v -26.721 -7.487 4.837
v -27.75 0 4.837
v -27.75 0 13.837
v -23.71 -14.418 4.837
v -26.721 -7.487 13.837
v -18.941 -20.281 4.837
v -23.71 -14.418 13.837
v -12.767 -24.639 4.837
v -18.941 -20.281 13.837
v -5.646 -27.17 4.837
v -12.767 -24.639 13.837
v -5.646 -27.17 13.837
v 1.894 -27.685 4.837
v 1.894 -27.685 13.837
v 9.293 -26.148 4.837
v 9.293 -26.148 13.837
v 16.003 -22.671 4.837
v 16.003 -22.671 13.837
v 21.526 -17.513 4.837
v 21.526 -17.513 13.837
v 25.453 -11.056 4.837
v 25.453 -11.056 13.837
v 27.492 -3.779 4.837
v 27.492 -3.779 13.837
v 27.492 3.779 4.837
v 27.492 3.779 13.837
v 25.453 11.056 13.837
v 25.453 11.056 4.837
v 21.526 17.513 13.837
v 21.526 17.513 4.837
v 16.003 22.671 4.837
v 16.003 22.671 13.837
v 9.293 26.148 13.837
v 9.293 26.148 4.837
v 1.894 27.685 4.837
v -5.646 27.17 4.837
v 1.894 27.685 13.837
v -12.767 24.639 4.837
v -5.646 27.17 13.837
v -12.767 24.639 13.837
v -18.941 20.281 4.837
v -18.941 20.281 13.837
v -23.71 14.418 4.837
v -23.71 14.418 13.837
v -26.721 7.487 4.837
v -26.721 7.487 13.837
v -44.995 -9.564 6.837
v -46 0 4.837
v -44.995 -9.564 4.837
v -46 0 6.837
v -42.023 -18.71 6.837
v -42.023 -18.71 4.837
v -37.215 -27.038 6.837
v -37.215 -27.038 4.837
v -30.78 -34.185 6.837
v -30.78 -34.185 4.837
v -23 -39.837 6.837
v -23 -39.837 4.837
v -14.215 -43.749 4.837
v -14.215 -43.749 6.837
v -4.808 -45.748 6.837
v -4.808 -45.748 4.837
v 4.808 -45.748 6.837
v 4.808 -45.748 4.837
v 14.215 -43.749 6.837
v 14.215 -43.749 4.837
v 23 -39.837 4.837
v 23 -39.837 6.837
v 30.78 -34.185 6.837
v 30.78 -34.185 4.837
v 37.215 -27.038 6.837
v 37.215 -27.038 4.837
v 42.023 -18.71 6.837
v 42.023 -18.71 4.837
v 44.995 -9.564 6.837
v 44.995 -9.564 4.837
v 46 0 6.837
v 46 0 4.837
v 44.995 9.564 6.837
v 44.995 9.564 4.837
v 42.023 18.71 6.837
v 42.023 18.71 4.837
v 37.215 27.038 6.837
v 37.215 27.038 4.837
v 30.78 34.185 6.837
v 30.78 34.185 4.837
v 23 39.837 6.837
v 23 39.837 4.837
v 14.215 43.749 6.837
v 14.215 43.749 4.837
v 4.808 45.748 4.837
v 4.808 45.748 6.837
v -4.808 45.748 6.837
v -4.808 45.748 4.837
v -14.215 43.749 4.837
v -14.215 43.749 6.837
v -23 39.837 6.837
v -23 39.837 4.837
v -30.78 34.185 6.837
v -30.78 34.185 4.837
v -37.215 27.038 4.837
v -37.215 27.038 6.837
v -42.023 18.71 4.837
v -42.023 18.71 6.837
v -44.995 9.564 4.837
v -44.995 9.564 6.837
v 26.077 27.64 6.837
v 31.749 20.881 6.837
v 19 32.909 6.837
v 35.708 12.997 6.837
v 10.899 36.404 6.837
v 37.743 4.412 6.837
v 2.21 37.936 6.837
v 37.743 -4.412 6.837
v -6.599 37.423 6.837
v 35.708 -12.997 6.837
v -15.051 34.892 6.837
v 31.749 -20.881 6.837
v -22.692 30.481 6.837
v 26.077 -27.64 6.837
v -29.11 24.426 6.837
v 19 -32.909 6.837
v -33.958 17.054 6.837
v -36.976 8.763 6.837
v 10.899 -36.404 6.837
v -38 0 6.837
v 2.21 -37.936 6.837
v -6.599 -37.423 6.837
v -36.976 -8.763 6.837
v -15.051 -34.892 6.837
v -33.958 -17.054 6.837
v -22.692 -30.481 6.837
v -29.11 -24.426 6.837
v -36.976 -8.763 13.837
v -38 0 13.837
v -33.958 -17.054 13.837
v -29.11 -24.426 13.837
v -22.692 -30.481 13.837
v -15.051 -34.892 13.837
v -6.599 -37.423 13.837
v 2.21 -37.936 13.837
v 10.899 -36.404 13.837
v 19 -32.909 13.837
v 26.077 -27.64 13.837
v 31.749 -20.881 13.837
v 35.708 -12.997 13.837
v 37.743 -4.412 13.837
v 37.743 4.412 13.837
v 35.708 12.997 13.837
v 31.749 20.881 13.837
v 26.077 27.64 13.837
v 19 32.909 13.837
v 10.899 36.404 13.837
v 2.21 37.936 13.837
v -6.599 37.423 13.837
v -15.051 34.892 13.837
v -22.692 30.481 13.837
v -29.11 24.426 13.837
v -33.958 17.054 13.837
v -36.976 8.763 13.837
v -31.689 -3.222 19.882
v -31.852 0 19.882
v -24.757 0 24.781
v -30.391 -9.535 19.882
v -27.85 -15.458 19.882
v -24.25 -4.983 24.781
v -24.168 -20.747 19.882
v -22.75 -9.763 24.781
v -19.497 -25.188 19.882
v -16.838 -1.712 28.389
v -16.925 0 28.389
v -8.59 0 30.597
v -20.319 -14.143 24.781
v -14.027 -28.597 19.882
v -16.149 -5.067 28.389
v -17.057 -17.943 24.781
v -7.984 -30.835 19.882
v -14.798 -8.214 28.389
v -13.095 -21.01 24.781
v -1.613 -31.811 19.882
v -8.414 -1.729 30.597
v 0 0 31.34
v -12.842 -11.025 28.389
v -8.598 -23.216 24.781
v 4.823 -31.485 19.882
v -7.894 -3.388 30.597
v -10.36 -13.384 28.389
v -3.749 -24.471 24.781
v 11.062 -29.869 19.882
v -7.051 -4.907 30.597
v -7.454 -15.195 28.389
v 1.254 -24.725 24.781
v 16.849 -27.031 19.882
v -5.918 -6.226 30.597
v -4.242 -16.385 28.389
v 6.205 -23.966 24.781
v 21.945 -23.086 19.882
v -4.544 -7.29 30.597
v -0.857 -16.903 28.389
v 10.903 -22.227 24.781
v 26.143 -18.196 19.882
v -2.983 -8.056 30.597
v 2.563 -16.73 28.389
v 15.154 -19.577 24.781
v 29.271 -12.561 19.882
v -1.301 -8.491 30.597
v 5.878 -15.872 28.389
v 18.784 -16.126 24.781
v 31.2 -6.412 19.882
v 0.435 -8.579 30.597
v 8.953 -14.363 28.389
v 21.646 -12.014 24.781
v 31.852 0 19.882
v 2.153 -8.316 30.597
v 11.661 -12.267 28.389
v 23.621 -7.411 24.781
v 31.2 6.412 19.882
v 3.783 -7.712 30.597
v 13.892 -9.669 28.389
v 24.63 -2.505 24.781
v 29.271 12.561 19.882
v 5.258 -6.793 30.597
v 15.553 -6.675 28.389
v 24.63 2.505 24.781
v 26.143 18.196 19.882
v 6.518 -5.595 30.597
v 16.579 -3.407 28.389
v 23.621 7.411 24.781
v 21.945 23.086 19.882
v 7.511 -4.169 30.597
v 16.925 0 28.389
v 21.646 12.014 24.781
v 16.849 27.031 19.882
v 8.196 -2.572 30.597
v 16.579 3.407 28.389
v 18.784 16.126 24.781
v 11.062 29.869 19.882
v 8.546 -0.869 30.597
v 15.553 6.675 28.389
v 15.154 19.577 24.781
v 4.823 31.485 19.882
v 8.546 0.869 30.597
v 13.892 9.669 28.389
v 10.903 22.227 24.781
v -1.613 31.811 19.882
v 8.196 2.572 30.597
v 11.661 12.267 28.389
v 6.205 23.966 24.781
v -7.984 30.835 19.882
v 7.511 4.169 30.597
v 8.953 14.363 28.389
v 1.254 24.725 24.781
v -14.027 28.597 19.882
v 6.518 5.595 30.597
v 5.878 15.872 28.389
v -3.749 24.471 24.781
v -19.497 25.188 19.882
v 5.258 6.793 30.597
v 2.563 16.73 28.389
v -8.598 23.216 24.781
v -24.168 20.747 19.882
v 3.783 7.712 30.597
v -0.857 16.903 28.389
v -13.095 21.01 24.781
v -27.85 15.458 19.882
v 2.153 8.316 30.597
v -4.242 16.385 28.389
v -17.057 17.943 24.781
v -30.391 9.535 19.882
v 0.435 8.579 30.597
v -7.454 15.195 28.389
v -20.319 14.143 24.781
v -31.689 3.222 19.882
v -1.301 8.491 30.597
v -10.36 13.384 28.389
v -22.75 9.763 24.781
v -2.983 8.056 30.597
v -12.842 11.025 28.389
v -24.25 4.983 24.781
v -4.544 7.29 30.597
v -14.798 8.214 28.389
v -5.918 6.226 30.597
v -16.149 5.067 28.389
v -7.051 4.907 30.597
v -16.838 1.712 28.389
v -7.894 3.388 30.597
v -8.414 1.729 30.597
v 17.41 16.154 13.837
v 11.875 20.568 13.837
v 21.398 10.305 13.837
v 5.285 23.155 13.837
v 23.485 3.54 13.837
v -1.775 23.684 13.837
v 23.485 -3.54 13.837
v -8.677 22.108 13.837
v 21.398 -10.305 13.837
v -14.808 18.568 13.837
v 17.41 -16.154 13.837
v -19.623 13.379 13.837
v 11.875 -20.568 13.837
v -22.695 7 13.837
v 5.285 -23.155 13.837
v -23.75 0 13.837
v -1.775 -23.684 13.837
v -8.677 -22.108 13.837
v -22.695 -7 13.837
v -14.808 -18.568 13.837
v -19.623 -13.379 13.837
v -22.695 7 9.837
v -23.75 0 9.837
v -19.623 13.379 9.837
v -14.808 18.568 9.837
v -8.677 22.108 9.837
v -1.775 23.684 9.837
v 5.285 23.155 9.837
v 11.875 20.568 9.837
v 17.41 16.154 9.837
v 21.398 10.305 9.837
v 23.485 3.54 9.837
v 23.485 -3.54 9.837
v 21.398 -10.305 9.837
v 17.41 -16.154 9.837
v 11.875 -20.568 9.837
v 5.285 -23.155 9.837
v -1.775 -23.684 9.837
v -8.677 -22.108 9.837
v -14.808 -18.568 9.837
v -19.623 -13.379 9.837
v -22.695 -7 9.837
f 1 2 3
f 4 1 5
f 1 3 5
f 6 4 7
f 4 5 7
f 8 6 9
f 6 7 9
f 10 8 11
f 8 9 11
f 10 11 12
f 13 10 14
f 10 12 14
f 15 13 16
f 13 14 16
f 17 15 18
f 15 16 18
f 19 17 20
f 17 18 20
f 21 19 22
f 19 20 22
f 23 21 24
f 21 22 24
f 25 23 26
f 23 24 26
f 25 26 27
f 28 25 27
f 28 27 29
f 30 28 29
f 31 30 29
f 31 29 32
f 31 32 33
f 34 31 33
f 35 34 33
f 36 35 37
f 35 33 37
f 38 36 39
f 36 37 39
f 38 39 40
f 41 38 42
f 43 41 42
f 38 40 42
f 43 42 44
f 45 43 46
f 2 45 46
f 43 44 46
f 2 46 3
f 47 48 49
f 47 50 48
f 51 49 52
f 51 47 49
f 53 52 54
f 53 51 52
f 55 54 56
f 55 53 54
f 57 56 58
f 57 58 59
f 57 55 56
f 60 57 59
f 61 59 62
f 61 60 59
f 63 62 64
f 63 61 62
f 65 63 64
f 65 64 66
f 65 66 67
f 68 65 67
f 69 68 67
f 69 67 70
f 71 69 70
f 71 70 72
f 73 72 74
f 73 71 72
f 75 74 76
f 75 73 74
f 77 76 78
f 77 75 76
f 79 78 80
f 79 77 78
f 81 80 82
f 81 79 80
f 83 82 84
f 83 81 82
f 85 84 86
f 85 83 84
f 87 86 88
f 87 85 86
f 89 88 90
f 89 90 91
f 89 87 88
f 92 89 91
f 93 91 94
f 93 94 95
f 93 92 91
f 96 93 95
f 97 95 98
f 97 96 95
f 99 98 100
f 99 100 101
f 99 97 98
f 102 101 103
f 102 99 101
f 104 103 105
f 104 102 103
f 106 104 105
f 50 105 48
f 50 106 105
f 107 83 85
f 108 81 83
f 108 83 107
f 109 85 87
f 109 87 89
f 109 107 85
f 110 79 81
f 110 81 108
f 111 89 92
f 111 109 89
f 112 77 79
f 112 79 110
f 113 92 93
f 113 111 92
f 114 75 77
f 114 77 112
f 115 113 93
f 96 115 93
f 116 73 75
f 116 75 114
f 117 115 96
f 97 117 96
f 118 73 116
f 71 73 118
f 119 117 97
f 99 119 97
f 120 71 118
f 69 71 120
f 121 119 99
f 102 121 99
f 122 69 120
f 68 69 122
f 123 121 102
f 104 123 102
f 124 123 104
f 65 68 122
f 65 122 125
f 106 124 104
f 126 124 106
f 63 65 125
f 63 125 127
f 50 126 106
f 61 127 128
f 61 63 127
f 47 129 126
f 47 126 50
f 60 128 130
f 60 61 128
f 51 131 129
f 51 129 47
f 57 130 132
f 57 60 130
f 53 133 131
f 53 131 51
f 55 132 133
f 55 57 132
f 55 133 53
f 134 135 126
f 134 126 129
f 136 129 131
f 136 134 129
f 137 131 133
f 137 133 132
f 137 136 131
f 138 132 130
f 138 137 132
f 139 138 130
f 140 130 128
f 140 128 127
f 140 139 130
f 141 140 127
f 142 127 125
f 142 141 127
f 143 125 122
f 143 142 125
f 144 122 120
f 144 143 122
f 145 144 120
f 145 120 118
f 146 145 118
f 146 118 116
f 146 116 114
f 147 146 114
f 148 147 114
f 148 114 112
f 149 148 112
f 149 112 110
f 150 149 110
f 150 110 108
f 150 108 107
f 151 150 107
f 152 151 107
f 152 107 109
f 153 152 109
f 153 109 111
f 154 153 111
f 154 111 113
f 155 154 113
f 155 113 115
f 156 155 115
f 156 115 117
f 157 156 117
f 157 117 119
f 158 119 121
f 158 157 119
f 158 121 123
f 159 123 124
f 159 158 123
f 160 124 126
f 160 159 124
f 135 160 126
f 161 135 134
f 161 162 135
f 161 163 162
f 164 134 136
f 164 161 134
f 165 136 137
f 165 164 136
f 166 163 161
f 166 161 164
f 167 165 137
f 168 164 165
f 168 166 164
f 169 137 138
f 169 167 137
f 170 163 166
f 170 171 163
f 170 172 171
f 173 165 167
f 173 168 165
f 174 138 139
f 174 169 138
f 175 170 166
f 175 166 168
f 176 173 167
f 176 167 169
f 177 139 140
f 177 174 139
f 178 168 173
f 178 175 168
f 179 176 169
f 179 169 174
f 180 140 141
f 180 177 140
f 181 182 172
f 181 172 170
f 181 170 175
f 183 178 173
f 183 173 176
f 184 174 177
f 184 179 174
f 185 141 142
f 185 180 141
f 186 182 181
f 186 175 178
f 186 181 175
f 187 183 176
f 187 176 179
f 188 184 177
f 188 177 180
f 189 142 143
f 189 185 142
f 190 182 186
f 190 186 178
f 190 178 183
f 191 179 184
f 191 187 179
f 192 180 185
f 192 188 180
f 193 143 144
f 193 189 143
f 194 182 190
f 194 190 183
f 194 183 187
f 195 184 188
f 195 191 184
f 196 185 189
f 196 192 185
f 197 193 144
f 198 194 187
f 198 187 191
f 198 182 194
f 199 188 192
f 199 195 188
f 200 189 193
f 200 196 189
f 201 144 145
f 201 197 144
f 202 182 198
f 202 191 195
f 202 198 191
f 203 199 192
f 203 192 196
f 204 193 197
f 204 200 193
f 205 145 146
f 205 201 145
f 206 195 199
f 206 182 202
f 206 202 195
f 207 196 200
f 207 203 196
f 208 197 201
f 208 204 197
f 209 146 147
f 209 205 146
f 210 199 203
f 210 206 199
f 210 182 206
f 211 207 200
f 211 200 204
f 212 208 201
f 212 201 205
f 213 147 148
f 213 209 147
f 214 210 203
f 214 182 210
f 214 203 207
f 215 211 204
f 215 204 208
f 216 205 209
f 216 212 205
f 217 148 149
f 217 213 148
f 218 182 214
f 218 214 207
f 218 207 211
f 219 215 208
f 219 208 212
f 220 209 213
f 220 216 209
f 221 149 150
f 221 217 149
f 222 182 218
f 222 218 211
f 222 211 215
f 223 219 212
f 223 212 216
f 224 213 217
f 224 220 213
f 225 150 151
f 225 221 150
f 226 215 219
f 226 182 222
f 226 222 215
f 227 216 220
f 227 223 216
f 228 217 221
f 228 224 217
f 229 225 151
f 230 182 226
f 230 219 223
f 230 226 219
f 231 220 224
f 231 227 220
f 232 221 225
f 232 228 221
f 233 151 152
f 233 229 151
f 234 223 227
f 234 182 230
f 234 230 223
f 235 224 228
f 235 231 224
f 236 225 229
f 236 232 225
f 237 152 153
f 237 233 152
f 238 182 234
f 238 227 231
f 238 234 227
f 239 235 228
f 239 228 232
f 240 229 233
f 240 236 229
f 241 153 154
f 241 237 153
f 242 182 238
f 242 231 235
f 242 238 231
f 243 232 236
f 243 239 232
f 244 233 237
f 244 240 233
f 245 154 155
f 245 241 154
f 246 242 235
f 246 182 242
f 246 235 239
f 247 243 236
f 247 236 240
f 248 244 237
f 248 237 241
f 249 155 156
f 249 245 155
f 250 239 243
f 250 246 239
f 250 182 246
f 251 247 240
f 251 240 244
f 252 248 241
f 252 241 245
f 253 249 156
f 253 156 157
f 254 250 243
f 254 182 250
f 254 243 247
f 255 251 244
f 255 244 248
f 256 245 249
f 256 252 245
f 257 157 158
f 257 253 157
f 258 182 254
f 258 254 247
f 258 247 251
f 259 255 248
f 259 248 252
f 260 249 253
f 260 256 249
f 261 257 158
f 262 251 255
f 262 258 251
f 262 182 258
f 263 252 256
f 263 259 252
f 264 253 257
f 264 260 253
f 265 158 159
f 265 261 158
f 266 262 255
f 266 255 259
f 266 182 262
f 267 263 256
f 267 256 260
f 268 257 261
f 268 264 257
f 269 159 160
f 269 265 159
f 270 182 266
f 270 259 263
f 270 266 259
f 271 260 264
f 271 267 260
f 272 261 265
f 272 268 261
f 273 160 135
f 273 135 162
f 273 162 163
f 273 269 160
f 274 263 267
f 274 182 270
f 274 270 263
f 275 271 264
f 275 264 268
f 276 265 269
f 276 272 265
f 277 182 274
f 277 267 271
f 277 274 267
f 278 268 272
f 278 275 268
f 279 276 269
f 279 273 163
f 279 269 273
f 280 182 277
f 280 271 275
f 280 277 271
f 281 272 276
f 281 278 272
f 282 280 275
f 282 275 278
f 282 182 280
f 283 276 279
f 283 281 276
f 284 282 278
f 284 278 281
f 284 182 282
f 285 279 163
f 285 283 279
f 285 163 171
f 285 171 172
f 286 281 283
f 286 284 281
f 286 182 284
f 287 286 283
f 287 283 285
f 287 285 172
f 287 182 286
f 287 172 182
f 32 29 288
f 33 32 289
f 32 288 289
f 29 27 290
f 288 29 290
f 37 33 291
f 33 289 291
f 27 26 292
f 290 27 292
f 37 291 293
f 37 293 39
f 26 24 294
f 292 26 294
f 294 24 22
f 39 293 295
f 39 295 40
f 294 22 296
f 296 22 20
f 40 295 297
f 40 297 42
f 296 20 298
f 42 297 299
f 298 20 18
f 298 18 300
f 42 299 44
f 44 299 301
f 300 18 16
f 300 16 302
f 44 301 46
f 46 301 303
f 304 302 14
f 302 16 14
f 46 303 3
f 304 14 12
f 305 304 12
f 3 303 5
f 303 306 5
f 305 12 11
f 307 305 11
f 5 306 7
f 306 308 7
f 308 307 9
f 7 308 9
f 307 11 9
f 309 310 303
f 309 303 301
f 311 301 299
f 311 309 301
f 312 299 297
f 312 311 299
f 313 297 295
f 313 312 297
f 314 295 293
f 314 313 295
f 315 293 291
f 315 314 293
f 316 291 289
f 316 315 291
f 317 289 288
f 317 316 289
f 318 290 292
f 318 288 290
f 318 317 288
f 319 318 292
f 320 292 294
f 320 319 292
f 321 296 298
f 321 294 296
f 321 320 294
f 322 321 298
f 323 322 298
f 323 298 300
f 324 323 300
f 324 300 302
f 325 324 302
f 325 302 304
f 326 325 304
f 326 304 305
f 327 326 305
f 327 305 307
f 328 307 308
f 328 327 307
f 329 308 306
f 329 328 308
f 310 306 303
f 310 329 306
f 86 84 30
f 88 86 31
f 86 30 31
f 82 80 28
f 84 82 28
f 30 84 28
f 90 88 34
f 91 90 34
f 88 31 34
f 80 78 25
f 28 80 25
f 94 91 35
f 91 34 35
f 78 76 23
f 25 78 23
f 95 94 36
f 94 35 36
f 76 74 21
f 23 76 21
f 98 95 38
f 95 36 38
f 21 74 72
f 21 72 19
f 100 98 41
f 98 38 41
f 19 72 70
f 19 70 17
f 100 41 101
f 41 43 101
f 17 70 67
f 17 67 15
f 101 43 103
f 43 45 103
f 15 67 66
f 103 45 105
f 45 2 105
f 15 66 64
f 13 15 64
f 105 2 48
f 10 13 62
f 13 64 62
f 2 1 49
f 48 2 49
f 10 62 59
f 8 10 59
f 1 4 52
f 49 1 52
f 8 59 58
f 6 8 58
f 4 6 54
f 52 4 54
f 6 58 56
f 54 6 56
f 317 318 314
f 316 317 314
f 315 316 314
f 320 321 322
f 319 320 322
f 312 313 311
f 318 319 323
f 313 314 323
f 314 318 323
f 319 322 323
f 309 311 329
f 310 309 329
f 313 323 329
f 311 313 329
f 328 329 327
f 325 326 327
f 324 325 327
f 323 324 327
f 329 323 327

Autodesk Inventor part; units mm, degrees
ref_plane "YZ Plane" through (0, 0, 0) normal (1, 0, 0) x (0, 1, 0)
ref_plane "XZ Plane" through (0, 0, 0) normal (0, 1, 0) x (-1, 0, 0)
ref_plane "XY Plane" through (0, 0, 0) normal (0, 0, 1) x (1, 0, 0)
sketch "Skizze1" plane through (0, 0, 0) normal (0, 1, 0) x (-1, 0, 0)
  line L0 (27.25, -10) -> (27.25, -35.9351) construction
  line L1 (27.25, -35.9351) -> (-27.25, -35.9351) construction
  line L2 (24.25, -10) -> (24.25, 0) construction
  line L3 (46, 4.8366) -> (46, 6.8366)
  line L4 (46, 6.8366) -> (38, 6.8366)
  line L5 (0, 0) -> (0, 30) construction
  line L6 (38, 6.8366) -> (38, 13.8366)
  line L7 (46, 4.8366) -> (27.75, 4.8366)
  line L8 (27.75, 4.8366) -> (27.75, 13.8366)
  line L9 (27.75, 13.8366) -> (23.75, 13.8366)
  line L10 (23.75, 13.8366) -> (23.75, 9.8366)
  line L11 (-46, 4.8366) -> (-46, 6.8366)
  line L12 (-46, 6.8366) -> (-38, 6.8366)
  line L13 (-38, 6.8366) -> (-38, 13.8366)
  line L14 (-46, 4.8366) -> (-27.75, 4.8366)
  line L15 (-27.75, 4.8366) -> (-27.75, 13.8366)
  line L16 (-27.75, 13.8366) -> (-23.75, 13.8366)
  line L17 (-23.75, 13.8366) -> (-23.75, 9.8366)
  arc A0 (38, 13.8366) -> (-38, 13.8366) centre (0, -18.6595) ccw
  line L18 (23.75, 9.8366) -> (-23.75, 9.8366)
  line L19 (0, 9.8366) -> (0, 31.3405)
  point P0 (-27.25, -35.9351)
  dimension "d0" = 2
  dimension "d1" = 7
  dimension "d2" = 8
  dimension "d3" = 46
  dimension "d4" = 0.5
  dimension "d5" = 0.5
  dimension "d7" = 50
  dimension "d8" = 9
  dimension "d9" = 4
  dimension "d11" = 26.5038
revolve "Umdrehung1" add sketch "Skizze1" angle 360 about axis through (0, 0, 9.8366) along (0, 0, 1) contours L7 L8 L9 L10 L18 L19 A0 L6 L4 L3
